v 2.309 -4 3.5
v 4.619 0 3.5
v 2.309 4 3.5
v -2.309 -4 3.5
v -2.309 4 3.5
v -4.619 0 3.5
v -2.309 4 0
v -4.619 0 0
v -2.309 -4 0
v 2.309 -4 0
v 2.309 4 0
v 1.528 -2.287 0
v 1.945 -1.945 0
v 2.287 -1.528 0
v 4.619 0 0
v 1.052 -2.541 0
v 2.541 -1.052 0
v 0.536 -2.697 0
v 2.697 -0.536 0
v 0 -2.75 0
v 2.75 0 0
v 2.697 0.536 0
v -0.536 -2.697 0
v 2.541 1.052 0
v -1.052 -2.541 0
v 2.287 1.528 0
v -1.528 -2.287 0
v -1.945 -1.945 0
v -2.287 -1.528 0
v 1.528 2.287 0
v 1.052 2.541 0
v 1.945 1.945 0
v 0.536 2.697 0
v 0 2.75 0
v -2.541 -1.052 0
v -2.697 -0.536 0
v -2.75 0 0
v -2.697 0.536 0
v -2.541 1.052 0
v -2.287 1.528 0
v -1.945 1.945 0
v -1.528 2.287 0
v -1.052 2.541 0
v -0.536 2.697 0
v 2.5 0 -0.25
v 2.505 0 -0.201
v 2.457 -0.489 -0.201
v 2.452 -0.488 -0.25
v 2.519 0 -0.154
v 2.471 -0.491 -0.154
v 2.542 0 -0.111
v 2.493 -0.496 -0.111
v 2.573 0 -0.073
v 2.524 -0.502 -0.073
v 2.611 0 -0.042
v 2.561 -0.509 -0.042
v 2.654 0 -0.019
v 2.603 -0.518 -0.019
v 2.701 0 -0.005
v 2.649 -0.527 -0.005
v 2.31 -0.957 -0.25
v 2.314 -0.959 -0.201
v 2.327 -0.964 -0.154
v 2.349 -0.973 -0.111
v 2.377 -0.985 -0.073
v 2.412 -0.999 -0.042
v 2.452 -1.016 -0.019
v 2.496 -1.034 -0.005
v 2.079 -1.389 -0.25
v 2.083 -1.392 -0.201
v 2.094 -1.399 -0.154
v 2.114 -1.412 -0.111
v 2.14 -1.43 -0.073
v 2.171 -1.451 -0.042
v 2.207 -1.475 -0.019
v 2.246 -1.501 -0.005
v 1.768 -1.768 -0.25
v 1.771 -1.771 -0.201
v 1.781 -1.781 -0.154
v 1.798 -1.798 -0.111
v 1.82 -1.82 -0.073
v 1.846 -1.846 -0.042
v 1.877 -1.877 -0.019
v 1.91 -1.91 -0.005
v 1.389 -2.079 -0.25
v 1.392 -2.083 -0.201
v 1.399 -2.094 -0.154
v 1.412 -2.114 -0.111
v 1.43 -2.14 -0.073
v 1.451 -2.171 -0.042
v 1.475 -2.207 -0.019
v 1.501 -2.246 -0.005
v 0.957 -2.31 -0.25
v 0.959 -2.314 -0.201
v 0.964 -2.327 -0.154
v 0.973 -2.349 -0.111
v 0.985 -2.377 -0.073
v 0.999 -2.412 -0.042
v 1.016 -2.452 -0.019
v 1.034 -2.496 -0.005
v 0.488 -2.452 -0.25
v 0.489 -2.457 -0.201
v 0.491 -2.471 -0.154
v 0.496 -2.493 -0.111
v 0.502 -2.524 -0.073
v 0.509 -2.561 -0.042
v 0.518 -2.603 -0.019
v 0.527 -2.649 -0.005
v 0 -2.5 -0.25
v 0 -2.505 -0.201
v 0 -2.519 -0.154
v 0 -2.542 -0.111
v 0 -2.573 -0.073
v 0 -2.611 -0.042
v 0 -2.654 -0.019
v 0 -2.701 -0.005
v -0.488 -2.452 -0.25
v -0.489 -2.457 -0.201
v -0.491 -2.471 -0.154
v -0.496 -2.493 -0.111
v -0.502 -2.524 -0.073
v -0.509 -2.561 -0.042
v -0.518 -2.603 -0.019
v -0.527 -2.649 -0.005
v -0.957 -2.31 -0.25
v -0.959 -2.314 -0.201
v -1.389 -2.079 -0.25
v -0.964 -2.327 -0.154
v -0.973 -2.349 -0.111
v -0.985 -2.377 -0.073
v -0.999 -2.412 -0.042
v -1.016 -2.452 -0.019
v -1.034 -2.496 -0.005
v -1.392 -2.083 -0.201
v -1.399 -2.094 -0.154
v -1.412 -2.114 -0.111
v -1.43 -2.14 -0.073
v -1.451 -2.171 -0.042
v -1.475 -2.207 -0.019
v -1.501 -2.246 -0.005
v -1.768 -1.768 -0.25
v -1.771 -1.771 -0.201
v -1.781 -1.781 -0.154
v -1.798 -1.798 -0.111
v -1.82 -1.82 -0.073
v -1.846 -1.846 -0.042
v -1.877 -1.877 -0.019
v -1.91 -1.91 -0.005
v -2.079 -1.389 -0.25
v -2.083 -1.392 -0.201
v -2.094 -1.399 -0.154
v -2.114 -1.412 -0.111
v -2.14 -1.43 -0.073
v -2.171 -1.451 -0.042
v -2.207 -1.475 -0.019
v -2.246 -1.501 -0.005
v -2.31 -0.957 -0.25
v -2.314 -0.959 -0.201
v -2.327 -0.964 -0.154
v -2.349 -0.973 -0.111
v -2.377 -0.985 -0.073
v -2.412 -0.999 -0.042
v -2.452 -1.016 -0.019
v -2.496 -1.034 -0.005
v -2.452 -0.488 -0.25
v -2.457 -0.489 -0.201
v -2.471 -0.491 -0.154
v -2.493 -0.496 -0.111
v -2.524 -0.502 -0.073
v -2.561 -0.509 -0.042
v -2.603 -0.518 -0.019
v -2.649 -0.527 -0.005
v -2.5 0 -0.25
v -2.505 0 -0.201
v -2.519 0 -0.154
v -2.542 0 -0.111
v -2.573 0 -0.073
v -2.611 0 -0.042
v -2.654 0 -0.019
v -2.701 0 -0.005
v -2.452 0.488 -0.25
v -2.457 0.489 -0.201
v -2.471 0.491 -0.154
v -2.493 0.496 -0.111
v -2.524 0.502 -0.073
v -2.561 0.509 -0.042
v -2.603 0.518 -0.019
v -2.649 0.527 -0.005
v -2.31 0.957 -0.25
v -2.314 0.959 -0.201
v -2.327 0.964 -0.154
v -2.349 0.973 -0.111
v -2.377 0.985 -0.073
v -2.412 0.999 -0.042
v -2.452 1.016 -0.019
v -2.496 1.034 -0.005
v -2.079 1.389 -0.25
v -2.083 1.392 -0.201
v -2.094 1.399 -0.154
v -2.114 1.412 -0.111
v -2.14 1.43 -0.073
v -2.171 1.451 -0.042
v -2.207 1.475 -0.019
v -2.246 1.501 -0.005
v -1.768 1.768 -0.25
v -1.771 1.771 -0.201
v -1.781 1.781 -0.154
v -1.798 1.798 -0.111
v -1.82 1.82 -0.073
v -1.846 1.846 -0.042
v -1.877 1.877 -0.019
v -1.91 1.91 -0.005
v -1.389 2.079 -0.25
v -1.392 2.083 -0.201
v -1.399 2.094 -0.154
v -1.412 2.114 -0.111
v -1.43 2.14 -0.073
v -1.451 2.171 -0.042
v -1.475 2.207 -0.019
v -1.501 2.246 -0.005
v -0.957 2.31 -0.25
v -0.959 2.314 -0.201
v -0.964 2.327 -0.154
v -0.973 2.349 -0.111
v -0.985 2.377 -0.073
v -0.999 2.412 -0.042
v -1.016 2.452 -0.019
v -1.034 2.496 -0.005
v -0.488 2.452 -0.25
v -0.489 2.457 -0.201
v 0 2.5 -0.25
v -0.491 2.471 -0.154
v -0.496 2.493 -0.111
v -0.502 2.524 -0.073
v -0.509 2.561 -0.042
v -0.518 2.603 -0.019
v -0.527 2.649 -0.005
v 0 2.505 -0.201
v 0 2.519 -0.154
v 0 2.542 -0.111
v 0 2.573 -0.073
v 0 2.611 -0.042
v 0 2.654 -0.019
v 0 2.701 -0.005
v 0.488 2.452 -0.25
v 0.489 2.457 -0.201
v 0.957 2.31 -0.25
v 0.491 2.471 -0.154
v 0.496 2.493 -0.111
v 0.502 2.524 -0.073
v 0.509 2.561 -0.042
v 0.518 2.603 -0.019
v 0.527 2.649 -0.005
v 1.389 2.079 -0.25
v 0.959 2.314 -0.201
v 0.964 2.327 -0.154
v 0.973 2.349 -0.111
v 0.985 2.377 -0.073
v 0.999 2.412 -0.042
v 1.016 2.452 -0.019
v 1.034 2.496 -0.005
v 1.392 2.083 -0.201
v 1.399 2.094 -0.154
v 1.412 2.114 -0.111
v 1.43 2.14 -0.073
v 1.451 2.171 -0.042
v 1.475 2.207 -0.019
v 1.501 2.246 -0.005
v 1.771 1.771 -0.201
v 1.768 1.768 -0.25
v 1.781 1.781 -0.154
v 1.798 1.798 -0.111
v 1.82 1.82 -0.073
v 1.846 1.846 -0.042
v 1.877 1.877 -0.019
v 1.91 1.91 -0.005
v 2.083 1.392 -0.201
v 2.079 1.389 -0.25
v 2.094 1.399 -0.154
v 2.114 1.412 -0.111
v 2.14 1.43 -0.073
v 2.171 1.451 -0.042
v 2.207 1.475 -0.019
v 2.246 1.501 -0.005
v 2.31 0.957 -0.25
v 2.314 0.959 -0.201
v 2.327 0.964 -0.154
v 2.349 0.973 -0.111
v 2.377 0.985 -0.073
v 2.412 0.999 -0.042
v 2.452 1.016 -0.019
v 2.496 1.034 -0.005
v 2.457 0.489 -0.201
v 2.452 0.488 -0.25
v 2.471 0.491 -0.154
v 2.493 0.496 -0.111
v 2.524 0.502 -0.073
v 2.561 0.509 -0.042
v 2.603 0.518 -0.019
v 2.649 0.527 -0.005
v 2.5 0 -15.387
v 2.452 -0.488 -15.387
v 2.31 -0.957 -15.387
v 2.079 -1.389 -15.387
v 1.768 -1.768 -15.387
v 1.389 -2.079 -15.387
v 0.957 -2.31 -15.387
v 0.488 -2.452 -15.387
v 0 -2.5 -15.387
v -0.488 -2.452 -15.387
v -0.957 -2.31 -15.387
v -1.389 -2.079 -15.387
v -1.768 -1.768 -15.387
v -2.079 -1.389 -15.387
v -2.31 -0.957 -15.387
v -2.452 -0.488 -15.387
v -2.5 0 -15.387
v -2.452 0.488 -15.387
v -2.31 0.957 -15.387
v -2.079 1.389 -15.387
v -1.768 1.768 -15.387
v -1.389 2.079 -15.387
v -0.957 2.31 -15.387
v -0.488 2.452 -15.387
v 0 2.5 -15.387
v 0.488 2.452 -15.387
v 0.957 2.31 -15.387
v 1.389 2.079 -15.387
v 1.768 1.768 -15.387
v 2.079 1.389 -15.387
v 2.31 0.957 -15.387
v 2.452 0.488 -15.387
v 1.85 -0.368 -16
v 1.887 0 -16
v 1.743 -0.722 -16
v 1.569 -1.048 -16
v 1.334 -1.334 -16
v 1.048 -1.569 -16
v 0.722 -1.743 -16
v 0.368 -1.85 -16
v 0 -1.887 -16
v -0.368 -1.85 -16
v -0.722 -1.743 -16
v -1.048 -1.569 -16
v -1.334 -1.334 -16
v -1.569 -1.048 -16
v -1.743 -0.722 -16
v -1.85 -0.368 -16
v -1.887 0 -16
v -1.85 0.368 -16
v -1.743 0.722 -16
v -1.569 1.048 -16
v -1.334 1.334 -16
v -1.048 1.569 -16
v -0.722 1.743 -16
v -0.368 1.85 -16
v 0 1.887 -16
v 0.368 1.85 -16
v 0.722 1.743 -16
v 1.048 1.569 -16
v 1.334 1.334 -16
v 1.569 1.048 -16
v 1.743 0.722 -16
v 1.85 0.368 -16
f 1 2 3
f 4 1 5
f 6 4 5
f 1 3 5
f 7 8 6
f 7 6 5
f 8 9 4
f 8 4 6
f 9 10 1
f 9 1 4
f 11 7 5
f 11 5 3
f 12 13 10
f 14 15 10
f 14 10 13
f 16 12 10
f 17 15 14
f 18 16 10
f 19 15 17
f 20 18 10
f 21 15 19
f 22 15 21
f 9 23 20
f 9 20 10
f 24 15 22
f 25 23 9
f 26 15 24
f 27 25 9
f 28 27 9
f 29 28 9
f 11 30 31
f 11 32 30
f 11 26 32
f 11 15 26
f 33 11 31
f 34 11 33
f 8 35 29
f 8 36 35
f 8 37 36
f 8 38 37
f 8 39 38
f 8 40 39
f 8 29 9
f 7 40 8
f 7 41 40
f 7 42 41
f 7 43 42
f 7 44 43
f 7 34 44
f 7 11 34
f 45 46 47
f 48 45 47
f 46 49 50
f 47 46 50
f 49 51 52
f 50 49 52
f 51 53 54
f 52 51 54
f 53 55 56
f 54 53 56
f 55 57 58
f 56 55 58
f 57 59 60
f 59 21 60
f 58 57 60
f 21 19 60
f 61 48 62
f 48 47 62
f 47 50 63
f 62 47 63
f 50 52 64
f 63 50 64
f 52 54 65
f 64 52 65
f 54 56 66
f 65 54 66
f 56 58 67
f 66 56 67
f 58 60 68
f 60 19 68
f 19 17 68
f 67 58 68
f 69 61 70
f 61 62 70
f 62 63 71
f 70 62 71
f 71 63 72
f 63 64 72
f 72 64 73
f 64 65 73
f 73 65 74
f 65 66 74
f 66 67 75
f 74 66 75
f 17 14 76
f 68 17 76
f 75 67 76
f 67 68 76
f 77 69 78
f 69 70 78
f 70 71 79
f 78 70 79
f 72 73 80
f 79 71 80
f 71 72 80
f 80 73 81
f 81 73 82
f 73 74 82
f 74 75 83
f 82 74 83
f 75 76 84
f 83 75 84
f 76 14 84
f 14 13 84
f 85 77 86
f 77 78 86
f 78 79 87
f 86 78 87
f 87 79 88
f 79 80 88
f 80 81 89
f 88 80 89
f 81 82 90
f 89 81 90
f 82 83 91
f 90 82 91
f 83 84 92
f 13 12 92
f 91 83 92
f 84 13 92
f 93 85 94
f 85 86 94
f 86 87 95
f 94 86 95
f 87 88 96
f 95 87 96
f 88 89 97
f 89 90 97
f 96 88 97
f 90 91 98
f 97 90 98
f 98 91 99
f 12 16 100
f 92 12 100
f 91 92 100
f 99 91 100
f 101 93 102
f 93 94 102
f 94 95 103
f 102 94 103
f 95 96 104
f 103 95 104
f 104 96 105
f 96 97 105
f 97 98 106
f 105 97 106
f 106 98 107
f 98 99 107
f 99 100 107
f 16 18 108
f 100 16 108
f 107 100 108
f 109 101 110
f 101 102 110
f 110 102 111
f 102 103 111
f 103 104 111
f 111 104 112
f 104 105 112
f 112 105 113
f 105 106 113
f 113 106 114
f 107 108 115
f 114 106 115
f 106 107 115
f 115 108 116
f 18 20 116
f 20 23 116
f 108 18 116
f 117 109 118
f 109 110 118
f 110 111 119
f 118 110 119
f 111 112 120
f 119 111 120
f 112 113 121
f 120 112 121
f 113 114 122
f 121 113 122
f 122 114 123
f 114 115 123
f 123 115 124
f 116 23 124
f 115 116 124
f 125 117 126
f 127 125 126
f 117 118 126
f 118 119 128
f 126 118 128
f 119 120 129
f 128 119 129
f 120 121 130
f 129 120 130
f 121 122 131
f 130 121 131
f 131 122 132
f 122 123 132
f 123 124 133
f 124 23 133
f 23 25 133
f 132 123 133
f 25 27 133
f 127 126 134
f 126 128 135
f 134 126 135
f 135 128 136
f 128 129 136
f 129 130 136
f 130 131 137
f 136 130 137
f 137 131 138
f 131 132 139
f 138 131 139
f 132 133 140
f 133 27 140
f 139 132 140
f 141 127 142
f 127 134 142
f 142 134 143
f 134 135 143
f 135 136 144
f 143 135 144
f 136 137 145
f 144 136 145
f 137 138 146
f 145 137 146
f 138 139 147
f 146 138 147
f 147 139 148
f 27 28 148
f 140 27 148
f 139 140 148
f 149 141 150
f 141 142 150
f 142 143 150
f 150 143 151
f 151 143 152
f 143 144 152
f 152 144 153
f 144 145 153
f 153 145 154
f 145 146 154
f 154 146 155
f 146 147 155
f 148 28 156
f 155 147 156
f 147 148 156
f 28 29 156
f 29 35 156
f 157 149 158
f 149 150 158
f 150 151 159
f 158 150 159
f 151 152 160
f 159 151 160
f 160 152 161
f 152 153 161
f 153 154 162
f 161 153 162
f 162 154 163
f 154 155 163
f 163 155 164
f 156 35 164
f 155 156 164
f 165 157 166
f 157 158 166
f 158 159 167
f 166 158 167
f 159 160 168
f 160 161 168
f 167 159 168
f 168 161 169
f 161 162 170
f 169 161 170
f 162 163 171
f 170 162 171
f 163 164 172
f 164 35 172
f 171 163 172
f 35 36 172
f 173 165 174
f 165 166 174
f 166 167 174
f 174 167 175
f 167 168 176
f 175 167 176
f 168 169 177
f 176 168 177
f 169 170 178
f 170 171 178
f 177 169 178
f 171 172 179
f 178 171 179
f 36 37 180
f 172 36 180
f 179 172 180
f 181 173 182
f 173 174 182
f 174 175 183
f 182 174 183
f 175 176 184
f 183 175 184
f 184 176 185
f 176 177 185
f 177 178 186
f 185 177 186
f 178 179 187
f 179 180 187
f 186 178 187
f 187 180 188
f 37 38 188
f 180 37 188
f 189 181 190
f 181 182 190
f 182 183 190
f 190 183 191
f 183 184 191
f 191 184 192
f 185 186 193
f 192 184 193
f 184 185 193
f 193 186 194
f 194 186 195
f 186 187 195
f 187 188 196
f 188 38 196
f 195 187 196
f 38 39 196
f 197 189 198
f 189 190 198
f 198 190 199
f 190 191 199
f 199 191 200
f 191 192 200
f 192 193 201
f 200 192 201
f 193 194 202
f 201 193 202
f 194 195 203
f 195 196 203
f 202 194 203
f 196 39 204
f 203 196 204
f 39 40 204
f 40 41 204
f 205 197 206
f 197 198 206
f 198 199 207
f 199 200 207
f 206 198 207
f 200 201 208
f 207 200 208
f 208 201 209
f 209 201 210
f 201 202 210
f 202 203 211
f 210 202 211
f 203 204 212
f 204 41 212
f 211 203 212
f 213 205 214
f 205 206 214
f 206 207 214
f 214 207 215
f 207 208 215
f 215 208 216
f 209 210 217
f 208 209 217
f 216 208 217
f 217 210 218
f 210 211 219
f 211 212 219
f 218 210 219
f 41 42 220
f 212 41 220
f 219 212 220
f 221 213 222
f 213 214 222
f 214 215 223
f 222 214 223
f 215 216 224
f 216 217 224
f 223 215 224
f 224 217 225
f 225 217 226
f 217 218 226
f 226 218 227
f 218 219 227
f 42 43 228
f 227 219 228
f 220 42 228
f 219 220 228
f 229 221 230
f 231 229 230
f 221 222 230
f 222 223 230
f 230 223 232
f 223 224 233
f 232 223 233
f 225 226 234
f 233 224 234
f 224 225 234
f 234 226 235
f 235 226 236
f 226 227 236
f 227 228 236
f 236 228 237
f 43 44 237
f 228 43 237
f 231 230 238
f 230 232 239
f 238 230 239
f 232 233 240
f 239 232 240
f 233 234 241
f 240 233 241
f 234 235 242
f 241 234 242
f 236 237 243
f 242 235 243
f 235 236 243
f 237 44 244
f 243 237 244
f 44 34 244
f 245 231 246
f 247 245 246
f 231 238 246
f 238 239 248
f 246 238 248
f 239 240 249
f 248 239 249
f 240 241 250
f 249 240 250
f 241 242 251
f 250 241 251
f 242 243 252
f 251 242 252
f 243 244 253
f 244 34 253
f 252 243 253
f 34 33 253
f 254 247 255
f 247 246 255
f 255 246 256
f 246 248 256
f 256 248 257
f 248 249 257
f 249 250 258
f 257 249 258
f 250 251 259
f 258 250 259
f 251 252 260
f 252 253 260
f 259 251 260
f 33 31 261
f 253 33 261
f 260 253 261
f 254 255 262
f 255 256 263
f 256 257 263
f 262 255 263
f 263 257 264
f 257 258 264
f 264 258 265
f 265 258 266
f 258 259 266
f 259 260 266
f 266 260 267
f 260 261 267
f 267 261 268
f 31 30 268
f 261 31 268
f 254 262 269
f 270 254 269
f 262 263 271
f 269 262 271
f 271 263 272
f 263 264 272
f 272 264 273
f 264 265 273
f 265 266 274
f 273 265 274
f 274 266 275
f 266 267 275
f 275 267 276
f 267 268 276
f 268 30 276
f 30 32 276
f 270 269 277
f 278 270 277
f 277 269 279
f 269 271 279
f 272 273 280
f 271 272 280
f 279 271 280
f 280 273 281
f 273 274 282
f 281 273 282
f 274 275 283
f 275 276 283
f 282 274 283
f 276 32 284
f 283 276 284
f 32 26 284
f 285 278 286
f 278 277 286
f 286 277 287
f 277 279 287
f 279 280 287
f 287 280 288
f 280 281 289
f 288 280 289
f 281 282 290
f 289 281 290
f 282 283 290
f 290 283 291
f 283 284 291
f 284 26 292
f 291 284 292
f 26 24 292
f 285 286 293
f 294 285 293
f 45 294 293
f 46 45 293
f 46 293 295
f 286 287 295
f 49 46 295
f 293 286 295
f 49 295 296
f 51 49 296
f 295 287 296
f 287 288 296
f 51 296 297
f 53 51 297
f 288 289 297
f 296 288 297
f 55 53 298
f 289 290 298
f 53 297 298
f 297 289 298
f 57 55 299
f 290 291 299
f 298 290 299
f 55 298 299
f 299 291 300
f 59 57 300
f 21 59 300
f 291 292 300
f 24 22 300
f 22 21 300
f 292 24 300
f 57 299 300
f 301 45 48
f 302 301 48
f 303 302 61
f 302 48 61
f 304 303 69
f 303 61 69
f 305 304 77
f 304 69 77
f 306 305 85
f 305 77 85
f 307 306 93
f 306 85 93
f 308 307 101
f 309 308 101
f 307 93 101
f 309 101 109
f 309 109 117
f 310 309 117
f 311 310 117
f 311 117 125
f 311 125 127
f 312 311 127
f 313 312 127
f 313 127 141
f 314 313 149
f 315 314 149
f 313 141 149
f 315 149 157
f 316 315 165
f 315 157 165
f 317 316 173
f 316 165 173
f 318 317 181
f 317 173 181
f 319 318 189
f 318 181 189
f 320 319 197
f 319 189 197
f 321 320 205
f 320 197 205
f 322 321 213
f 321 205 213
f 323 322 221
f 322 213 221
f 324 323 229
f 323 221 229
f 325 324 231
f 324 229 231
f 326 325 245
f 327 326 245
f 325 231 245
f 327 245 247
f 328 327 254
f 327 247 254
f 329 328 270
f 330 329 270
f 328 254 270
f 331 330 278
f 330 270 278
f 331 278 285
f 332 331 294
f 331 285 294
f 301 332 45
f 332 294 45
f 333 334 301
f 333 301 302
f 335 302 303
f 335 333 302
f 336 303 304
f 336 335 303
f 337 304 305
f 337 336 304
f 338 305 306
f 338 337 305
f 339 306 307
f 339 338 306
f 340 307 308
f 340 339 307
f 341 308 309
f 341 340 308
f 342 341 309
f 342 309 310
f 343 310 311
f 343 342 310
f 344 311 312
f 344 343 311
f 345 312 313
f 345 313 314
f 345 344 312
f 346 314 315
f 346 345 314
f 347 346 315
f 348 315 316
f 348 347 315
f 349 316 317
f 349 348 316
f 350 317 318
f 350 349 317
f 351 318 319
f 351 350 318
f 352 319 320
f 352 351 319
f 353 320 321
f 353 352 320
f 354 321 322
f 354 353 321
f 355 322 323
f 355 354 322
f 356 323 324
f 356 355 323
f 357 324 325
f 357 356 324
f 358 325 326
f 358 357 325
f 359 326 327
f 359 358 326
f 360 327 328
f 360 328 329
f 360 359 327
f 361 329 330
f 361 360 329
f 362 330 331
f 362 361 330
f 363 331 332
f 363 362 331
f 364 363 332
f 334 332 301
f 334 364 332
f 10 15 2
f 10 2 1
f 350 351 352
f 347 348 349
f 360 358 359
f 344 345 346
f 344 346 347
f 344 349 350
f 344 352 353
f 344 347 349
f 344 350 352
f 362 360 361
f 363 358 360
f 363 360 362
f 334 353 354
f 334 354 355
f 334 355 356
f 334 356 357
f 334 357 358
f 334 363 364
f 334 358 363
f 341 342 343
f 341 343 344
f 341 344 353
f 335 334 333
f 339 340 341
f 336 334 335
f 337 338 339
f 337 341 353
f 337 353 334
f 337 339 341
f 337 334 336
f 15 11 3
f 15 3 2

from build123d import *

# Parameters (mm, degrees)
BASE_EXTRUDE_DEPTH  = 3.5
SKETCH3_R           = 2.5
BOSS_EXTRUDE1_DEPTH = 16
CHAMFER1_SIZE       = 0.6134
FILLET1_R           = 0.25


with BuildPart() as part:
    # Sketch1 → Base-Extrude (new body)
    with BuildSketch(Plane.XY):
        Polygon((-2.309401077, 4), (2.309401077, 4), (4.618802154, 0), (2.309401077, -4), (-2.309401077, -4), (-4.618802154, 0), align=None)
    extrude(amount=BASE_EXTRUDE_DEPTH)

    # Sketch3 → Boss-Extrude1 (add)
    with BuildSketch(Plane(origin=(0, 0, 0), x_dir=(-1, 0, 0), z_dir=(0, 0, -1))):
        with Locations(Location((0, 0, 0), (0, 0, 180))):
            Circle(SKETCH3_R)
    extrude(amount=BOSS_EXTRUDE1_DEPTH)

    # Chamfer1
    chamfer1_edges = [part.edges().sort_by_distance(p)[0] for p in [
        (-2.5, 0, -16),
    ]]
    chamfer(chamfer1_edges, length=CHAMFER1_SIZE)

    # Fillet1
    fillet1_edges = [part.edges().sort_by_distance(p)[0] for p in [
        (-2.5, 0, 0),
    ]]
    fillet(fillet1_edges, radius=FILLET1_R)


solid = part.part
